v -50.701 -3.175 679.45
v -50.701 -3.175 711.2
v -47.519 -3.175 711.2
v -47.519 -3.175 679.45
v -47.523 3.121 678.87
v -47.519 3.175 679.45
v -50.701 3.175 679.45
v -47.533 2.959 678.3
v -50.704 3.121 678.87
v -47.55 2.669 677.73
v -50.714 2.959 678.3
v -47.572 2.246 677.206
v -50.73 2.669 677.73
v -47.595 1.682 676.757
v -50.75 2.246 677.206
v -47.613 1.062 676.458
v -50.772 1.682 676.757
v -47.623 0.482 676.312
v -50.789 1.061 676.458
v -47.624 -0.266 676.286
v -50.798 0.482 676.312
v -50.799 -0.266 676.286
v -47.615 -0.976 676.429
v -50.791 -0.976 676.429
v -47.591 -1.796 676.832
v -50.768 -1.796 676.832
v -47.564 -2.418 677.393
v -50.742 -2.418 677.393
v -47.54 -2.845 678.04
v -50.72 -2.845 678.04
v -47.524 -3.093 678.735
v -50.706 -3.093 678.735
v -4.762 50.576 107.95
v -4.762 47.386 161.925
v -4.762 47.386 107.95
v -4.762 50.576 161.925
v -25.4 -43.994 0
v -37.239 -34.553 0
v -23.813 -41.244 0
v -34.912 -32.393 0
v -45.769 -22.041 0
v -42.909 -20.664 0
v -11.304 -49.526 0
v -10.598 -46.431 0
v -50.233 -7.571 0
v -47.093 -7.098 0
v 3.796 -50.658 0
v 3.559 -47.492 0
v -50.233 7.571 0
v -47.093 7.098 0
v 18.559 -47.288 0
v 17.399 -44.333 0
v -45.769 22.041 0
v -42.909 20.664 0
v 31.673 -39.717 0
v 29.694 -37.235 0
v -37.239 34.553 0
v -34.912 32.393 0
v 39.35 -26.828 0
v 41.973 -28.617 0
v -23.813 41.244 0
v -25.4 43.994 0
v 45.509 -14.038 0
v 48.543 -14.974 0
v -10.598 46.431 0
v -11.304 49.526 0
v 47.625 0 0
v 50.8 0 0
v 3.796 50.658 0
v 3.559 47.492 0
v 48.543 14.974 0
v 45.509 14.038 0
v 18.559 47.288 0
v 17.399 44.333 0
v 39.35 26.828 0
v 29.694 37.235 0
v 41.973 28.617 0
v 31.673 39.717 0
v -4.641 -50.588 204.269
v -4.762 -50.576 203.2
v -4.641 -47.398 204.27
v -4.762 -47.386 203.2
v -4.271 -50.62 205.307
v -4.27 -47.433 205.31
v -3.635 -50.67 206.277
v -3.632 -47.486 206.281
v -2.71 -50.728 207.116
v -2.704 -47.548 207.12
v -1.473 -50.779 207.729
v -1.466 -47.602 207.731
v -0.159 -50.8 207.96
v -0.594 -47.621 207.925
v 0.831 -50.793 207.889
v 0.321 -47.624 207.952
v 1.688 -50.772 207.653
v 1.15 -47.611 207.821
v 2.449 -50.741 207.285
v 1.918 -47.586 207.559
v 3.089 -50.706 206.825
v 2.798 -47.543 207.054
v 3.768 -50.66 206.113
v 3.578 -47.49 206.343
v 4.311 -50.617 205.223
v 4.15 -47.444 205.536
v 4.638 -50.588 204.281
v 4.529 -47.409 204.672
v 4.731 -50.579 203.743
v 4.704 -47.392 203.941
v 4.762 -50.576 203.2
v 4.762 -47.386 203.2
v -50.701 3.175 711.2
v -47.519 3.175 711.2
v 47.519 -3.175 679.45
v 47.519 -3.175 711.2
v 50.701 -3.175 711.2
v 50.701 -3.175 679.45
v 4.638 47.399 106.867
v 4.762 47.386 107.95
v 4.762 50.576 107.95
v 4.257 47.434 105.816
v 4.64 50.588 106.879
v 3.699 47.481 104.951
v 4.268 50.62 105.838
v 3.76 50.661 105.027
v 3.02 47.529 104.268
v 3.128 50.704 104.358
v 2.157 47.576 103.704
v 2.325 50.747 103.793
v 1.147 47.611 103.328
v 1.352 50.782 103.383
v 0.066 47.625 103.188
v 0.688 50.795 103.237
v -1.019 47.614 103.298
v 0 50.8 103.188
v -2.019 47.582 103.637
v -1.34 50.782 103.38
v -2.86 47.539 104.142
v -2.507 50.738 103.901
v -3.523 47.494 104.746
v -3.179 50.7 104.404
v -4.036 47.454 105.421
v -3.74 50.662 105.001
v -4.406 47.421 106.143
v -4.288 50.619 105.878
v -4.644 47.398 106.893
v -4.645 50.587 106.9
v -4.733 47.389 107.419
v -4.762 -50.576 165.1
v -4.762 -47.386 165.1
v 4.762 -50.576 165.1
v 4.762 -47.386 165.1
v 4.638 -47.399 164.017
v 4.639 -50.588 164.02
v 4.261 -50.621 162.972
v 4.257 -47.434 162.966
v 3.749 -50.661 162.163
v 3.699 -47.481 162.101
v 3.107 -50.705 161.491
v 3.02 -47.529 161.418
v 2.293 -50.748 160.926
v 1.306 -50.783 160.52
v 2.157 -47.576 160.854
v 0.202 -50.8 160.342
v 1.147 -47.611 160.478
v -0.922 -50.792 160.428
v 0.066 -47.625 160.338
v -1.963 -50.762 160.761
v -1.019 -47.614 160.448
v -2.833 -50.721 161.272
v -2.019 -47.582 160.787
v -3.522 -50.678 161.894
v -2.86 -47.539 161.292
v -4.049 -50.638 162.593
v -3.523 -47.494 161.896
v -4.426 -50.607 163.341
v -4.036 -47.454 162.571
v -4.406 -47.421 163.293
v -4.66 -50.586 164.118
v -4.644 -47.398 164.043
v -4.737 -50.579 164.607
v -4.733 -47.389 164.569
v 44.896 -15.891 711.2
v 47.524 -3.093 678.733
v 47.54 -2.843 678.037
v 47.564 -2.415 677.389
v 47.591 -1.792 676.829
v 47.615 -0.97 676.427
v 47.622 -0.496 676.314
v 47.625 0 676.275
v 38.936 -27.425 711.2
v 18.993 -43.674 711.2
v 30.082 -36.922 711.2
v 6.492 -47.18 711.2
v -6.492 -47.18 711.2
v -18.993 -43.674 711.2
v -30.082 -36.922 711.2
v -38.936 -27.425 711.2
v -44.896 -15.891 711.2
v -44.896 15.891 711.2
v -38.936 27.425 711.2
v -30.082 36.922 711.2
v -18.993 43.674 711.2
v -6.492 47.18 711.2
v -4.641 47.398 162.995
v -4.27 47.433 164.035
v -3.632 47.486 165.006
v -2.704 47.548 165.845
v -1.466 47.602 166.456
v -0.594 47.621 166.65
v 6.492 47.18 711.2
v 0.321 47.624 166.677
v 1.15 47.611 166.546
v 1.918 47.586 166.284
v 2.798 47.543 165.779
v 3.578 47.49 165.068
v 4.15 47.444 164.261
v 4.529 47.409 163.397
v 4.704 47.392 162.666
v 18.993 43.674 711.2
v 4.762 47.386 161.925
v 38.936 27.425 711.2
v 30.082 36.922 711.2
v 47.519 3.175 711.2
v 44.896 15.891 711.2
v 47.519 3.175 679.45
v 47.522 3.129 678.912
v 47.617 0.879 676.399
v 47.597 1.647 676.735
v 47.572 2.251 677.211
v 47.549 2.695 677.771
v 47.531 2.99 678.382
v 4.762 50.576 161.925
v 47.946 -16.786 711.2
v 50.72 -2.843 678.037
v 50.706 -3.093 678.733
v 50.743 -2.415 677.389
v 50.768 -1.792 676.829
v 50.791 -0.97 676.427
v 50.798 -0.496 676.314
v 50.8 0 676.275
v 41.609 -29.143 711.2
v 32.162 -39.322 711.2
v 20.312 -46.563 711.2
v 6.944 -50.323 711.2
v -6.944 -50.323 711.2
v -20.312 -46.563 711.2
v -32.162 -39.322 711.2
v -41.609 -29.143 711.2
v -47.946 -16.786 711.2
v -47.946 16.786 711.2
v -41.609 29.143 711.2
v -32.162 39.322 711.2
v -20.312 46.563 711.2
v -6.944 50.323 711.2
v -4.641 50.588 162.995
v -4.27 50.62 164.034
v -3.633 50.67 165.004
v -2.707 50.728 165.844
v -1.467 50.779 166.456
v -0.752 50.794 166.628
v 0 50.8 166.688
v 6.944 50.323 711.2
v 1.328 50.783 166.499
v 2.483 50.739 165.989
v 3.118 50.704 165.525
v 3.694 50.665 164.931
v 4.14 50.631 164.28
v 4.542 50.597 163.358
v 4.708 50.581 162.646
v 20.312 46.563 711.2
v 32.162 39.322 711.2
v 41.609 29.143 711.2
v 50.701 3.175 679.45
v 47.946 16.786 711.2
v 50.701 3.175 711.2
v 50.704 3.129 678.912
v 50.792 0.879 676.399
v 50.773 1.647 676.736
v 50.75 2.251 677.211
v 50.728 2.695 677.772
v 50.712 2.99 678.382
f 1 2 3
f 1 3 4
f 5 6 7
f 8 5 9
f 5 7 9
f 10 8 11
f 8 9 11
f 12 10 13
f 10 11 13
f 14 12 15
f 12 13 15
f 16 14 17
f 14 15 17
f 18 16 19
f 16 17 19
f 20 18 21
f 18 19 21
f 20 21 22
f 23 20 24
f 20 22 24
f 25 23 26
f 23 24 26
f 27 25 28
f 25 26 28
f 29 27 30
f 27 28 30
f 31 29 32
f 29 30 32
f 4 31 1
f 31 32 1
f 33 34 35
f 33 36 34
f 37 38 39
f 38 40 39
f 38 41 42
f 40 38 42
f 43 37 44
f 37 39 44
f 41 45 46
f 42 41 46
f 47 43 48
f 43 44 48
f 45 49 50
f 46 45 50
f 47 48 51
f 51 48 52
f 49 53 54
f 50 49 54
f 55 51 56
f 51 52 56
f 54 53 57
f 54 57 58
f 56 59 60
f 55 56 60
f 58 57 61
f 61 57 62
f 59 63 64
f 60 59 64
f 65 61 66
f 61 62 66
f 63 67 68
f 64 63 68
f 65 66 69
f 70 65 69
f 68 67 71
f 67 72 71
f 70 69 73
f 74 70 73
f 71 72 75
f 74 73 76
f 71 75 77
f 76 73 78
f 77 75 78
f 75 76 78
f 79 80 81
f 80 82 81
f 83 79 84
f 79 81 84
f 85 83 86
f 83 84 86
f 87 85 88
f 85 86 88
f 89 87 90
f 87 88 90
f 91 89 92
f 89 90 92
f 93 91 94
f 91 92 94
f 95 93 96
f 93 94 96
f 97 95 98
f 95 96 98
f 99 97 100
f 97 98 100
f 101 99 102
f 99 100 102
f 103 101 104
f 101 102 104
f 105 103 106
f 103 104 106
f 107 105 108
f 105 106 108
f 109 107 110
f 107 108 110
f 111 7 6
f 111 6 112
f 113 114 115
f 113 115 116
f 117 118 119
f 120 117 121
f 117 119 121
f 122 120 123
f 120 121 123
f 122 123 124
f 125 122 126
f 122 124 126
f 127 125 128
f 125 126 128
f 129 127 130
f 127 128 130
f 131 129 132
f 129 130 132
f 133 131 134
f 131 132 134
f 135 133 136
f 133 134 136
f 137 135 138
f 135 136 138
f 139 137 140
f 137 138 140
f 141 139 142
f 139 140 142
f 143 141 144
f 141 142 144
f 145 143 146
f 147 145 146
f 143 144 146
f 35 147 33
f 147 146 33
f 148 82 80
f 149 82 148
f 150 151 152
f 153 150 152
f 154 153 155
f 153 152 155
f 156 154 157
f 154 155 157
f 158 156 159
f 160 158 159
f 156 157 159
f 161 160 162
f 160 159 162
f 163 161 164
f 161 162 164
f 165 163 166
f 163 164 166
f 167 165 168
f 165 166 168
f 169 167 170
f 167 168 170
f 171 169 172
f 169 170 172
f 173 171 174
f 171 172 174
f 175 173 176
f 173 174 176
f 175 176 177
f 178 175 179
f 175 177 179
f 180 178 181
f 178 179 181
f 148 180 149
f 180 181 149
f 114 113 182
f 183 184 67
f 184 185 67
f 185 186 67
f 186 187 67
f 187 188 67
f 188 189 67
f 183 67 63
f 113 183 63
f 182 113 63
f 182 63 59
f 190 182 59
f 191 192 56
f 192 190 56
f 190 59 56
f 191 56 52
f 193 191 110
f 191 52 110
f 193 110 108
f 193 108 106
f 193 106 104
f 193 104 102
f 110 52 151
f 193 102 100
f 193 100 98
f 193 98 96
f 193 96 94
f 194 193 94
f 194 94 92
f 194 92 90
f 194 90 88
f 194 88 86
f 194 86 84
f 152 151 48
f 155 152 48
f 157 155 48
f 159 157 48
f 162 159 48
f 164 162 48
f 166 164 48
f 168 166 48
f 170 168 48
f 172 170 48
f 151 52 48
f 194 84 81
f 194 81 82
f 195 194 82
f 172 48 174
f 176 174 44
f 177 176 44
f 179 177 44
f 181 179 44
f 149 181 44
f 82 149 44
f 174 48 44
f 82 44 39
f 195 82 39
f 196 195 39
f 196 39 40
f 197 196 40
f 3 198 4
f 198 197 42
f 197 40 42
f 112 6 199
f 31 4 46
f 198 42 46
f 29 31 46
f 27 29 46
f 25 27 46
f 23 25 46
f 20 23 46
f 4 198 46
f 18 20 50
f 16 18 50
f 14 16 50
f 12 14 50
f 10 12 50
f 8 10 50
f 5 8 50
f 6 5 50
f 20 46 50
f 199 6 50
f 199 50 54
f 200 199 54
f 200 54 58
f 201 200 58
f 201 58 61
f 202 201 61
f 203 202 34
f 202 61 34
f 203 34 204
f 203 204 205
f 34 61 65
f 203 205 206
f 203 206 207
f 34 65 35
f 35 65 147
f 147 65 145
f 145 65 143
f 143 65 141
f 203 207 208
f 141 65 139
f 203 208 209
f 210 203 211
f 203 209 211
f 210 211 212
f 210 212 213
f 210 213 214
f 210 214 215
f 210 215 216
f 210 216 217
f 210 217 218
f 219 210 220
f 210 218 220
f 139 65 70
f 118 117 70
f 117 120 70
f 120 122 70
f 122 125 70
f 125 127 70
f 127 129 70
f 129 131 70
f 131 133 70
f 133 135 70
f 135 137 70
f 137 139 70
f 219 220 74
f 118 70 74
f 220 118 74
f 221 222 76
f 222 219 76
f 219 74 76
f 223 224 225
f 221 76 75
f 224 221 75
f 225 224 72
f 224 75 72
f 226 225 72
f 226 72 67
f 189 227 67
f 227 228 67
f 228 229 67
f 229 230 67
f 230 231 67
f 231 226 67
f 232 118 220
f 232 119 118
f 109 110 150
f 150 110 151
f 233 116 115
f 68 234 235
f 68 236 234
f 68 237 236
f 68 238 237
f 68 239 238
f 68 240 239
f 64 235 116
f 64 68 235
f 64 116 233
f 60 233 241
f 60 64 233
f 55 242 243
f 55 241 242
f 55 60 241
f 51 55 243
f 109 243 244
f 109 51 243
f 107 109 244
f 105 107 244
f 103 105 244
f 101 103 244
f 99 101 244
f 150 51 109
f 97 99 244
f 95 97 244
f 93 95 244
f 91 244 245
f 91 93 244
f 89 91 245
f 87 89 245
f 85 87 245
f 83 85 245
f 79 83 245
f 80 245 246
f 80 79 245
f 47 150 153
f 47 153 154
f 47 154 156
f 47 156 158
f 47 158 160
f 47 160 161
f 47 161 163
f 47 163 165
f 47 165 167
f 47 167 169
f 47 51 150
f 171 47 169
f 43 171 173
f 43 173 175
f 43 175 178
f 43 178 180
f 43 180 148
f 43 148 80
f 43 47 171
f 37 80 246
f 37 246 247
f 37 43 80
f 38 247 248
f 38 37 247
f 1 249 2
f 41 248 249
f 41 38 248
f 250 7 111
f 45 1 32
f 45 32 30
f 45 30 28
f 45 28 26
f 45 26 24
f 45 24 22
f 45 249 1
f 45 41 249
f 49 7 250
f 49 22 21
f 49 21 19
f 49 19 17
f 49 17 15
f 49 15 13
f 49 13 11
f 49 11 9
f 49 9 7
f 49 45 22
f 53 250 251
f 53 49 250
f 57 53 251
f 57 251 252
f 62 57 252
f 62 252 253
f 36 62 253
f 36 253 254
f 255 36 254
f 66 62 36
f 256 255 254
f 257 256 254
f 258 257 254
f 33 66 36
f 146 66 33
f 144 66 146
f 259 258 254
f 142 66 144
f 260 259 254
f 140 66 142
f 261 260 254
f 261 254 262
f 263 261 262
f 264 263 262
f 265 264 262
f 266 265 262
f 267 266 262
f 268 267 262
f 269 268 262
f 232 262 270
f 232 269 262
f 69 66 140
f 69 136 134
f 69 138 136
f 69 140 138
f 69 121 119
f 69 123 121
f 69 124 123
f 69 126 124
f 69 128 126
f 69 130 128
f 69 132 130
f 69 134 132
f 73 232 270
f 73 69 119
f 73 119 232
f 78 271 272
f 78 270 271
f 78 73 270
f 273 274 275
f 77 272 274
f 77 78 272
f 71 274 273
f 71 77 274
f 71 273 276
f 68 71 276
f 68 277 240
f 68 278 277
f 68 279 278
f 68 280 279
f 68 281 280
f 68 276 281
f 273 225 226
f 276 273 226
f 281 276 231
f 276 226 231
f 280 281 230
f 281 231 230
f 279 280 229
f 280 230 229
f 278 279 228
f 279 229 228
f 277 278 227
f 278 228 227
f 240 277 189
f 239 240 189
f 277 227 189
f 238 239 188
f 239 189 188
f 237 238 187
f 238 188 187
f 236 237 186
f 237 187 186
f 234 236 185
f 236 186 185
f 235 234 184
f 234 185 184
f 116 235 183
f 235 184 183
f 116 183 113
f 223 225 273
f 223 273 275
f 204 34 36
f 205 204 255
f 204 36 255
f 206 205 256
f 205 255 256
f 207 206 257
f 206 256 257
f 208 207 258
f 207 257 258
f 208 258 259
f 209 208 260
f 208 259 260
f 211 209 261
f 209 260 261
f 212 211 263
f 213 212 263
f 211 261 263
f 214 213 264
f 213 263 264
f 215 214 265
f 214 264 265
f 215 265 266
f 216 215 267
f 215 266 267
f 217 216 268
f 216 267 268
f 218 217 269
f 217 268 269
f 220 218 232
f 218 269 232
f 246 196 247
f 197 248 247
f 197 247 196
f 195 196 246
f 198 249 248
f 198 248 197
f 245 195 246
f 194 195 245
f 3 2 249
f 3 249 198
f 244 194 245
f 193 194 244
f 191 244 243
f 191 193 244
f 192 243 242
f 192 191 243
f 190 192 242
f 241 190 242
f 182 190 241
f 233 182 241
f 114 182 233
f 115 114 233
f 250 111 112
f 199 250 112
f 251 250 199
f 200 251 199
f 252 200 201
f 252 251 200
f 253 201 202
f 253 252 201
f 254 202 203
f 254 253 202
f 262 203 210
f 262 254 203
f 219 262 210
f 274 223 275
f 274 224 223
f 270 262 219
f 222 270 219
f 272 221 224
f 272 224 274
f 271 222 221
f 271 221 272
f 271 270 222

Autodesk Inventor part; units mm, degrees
ref_plane "YZ Plane" through (0, 0, 0) normal (1, 0, 0) x (0, 1, 0)
ref_plane "XY Plane" through (0, 0, 0) normal (0, 0, 1) x (1, 0, 0)
sketch "Sketch1" plane through (0, 0, 0) normal (0, 0, 1) x (1, 0, 0)
  circle A0 centre (0, 0) radius 50.8
  circle A1 centre (0, 0) radius 47.625
  dimension "d0" = 101.6
  dimension "d1" = 95.25
extrude "Extrusion1" add sketch "Sketch1" along normal blind 711.2
ref_plane "Work Plane1" through (0, 50.8, 0) normal (0, 1, 0) x (-1, 0, 0)
sketch "Sketch5" plane through (0, 0, 0) normal (1, 0, 0) x (0, 1, 0)
  line L0 (50.8, 711.2) -> (-50.8, 711.2) construction
  line L1 (-50.8, 0) -> (50.8, 0) construction
  line L2 (3.175, 711.2) -> (-3.175, 711.2)
  line L3 (-3.175, 711.2) -> (-3.175, 679.45)
  line L4 (3.175, 679.45) -> (3.175, 711.2)
  arc A0 (-3.175, 679.45) -> (3.175, 679.45) centre (0, 679.45) ccw
  line L5 (0, 769.9295) -> (0, 0) construction
  dimension "d16" = 3.175
  dimension "d17" = 31.75
extrude "Extrusion4" cut sketch "Sketch5" along normal through all both and the other way through all
sketch "Sketch6" plane through (0, 0, 0) normal (0, 1, 0) x (-1, 0, 0)
  line L0 (4.7625, 203.2) -> (4.7625, 165.1)
  line L1 (-4.7625, 203.2) -> (-4.7625, 165.1)
  arc A0 (4.7625, 203.2) -> (-4.7625, 203.2) centre (0, 203.2) ccw
  arc A1 (-4.7625, 165.1) -> (4.7625, 165.1) centre (0, 165.1) ccw
  point P0 (0, 0)
  dimension "d20" = 203.2
  dimension "d21" = 165.1
  dimension "d22" = 9.525
extrude "Extrusion5" cut sketch "Sketch6" against normal through all
sketch "Sketch7" plane through (0, 50.8, 0) normal (0, 1, 0) x (-1, 0, 0)
  line L0 (4.7625, 161.925) -> (4.7625, 107.95)
  line L1 (-4.7625, 107.95) -> (-4.7625, 161.925)
  arc A0 (-4.7625, 107.95) -> (4.7625, 107.95) centre (0, 107.95) ccw
  arc A1 (4.7625, 161.925) -> (-4.7625, 161.925) centre (0, 161.925) ccw
  line L2 (-50.8, 0) -> (50.8, 0) projected
  point P0 (0, 0)
  dimension "d25" = 107.95
  dimension "d26" = 161.925
  dimension "d27" = 9.525
extrude "Extrusion6" cut sketch "Sketch7" against normal blind 25.4
properties part number "PrimaryHullLexanTube_01" material "Polycarbonate, Clear"
